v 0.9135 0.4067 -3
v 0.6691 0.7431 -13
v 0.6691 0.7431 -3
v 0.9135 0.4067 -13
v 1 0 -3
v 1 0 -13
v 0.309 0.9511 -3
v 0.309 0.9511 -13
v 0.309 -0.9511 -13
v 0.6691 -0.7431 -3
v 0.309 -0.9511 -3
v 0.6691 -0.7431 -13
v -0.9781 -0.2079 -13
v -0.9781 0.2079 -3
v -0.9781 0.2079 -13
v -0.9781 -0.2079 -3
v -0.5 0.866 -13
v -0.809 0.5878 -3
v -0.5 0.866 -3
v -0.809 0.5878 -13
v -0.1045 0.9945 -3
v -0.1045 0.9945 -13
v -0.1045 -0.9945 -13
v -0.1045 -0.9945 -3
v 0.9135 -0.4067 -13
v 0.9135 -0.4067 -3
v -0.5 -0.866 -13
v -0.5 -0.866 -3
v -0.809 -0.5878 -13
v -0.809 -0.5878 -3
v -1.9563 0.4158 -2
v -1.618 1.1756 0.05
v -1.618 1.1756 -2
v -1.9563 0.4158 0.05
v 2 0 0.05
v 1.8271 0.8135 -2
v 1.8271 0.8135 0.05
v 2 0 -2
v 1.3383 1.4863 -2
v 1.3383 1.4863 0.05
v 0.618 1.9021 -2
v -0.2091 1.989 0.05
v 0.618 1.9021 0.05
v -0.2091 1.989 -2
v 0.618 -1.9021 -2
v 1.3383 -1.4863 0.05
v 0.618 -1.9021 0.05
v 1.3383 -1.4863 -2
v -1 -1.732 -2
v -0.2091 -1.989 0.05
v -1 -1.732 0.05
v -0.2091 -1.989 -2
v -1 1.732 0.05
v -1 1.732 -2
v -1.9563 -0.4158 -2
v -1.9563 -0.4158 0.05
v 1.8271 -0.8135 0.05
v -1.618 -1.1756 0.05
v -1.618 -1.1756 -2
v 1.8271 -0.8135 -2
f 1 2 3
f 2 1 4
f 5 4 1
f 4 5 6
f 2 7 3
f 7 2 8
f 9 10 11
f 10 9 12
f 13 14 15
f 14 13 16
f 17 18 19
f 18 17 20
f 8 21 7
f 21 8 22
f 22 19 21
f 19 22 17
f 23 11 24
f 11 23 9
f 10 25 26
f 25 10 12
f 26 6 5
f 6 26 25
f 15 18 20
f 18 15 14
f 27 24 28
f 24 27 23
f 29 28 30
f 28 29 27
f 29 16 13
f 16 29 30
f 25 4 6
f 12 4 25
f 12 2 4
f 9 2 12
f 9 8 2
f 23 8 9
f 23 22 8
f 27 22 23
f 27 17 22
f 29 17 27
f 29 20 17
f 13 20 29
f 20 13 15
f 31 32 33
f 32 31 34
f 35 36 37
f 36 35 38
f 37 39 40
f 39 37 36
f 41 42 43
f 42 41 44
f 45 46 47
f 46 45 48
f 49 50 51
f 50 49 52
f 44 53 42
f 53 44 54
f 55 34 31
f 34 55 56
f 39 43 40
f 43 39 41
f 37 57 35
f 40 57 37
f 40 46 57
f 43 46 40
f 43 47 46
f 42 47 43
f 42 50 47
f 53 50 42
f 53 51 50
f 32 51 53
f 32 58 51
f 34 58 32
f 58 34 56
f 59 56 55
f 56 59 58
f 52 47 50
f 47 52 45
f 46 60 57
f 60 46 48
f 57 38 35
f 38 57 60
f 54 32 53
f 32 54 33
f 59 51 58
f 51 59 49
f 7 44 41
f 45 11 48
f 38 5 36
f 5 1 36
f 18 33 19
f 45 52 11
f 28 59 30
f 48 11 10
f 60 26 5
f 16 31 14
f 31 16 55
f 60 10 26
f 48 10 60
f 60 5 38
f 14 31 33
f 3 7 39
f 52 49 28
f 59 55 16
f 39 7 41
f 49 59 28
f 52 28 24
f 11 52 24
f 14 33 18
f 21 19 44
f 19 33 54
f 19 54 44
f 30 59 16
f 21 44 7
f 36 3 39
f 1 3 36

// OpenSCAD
// file: ../Settings.scad
// Mesurements Of Platform Actual & Global Settings
// Mesurements ACTUAL
PlateWidth = 228;
PlateDepth = 145;
PlateHeight = 5;

ArmWidth = 20;
ArmHeight = 24;
ArmForwardProjection = 25;
ArmRearProjection = 50;
ArmVOffset = 15;

BaseWidth = 129;
BaseHeight = 5;
BaseForwardProjection = 10;
BaseRearProjection = 10;
BaseVOffset = 20;

BaseDeflectorLength = 20;
BaseDeflectorAngle = 45;

ScrewsWidthOutset = 35;
ScrewsDepthOutset = 35;
ScrewsHeadRadius = 10;
ScrewsHeadHeight = 2;
ScrewsHeadProtrusion = 5;
ScrewsShaftRadius = 2;
ScrewsHeadCutoutRadius = 2;

RearPlugWidth = 10;
RearPlugHeight = 5;
RearPlugVOffset = 1;

// Options
// ****************************************************************************************************

d = 0.05;   //Delta

ClipSticksize = 8;
PlateThickness = 5;

TensionerBearingRadius = 2;
TensionerOffsetRadius = 15;
TensionerAngle = 45;
TensionerBearingExtention = 3;
TensionerInset = 2;

//lips to keep the belt in
Lip = 3;
//TopLip = 500;
BottomLip = 5;

MidPlateOverlap = 20;
MidPlateOverlapHeight = 10;
MidPlateOverlapOffset = 7;
ClipHoleSize = 5;

LowerPlateCrossover =10;

RollerCore = 2;
RollerClearance = 2;
RollerLength = PlateDepth - 2*RollerClearance;

UpperRollerProjection  = 40;
UpperRollerRadius = 8;

LowerRollerProjection = 20;
LowerRollerRadius = 6;

RollerBearingCutoutRadius = 3;

IbeamProjection = 15;
IbeamPlateThikness = 6;


// Calculated
// ************************************************************************************************************
PlateX = BaseWidth/2;

RollerLength = PlateDepth - 2*RollerClearance;
PlateArmOverhang = PlateWidth/2 - BaseWidth/2  - ArmWidth; 

UpperRollerPlateX = ArmWidth+PlateArmOverhang+UpperRollerProjection-UpperRollerRadius;
UpperRollerPlateY = -UpperRollerRadius; 

LowerRollerPlateX = ArmWidth+PlateArmOverhang+LowerRollerProjection-LowerRollerRadius;
LowerRollerPlateY = -(ArmVOffset+ArmHeight)+LowerRollerRadius;
// main file
//Misc
include <../Settings.scad>;

ScrewHole();

module ScrewHole(
ThreadLength = 10,
ThreadRadius = 1,
SinkLength = 2,
SinkRadius = 2,
SinkTaperLength = 1){
	translate(v=[0,0,-ThreadLength-SinkTaperLength-SinkLength])
		color("DarkViolet") cylinder(h=ThreadLength,r=ThreadRadius, $fn = 15);

	translate(v=[0,0,-SinkLength])
		color("RosyBrown") cylinder(h=SinkLength+d,r=SinkRadius, $fn = 15);

	translate(v=[0,0,-SinkLength-SinkTaperLength])
		color("RosyBrown") cylinder(h=SinkTaperLength,r1=ThreadRadius,r2=SinkRadius , $fn = 15);
};
